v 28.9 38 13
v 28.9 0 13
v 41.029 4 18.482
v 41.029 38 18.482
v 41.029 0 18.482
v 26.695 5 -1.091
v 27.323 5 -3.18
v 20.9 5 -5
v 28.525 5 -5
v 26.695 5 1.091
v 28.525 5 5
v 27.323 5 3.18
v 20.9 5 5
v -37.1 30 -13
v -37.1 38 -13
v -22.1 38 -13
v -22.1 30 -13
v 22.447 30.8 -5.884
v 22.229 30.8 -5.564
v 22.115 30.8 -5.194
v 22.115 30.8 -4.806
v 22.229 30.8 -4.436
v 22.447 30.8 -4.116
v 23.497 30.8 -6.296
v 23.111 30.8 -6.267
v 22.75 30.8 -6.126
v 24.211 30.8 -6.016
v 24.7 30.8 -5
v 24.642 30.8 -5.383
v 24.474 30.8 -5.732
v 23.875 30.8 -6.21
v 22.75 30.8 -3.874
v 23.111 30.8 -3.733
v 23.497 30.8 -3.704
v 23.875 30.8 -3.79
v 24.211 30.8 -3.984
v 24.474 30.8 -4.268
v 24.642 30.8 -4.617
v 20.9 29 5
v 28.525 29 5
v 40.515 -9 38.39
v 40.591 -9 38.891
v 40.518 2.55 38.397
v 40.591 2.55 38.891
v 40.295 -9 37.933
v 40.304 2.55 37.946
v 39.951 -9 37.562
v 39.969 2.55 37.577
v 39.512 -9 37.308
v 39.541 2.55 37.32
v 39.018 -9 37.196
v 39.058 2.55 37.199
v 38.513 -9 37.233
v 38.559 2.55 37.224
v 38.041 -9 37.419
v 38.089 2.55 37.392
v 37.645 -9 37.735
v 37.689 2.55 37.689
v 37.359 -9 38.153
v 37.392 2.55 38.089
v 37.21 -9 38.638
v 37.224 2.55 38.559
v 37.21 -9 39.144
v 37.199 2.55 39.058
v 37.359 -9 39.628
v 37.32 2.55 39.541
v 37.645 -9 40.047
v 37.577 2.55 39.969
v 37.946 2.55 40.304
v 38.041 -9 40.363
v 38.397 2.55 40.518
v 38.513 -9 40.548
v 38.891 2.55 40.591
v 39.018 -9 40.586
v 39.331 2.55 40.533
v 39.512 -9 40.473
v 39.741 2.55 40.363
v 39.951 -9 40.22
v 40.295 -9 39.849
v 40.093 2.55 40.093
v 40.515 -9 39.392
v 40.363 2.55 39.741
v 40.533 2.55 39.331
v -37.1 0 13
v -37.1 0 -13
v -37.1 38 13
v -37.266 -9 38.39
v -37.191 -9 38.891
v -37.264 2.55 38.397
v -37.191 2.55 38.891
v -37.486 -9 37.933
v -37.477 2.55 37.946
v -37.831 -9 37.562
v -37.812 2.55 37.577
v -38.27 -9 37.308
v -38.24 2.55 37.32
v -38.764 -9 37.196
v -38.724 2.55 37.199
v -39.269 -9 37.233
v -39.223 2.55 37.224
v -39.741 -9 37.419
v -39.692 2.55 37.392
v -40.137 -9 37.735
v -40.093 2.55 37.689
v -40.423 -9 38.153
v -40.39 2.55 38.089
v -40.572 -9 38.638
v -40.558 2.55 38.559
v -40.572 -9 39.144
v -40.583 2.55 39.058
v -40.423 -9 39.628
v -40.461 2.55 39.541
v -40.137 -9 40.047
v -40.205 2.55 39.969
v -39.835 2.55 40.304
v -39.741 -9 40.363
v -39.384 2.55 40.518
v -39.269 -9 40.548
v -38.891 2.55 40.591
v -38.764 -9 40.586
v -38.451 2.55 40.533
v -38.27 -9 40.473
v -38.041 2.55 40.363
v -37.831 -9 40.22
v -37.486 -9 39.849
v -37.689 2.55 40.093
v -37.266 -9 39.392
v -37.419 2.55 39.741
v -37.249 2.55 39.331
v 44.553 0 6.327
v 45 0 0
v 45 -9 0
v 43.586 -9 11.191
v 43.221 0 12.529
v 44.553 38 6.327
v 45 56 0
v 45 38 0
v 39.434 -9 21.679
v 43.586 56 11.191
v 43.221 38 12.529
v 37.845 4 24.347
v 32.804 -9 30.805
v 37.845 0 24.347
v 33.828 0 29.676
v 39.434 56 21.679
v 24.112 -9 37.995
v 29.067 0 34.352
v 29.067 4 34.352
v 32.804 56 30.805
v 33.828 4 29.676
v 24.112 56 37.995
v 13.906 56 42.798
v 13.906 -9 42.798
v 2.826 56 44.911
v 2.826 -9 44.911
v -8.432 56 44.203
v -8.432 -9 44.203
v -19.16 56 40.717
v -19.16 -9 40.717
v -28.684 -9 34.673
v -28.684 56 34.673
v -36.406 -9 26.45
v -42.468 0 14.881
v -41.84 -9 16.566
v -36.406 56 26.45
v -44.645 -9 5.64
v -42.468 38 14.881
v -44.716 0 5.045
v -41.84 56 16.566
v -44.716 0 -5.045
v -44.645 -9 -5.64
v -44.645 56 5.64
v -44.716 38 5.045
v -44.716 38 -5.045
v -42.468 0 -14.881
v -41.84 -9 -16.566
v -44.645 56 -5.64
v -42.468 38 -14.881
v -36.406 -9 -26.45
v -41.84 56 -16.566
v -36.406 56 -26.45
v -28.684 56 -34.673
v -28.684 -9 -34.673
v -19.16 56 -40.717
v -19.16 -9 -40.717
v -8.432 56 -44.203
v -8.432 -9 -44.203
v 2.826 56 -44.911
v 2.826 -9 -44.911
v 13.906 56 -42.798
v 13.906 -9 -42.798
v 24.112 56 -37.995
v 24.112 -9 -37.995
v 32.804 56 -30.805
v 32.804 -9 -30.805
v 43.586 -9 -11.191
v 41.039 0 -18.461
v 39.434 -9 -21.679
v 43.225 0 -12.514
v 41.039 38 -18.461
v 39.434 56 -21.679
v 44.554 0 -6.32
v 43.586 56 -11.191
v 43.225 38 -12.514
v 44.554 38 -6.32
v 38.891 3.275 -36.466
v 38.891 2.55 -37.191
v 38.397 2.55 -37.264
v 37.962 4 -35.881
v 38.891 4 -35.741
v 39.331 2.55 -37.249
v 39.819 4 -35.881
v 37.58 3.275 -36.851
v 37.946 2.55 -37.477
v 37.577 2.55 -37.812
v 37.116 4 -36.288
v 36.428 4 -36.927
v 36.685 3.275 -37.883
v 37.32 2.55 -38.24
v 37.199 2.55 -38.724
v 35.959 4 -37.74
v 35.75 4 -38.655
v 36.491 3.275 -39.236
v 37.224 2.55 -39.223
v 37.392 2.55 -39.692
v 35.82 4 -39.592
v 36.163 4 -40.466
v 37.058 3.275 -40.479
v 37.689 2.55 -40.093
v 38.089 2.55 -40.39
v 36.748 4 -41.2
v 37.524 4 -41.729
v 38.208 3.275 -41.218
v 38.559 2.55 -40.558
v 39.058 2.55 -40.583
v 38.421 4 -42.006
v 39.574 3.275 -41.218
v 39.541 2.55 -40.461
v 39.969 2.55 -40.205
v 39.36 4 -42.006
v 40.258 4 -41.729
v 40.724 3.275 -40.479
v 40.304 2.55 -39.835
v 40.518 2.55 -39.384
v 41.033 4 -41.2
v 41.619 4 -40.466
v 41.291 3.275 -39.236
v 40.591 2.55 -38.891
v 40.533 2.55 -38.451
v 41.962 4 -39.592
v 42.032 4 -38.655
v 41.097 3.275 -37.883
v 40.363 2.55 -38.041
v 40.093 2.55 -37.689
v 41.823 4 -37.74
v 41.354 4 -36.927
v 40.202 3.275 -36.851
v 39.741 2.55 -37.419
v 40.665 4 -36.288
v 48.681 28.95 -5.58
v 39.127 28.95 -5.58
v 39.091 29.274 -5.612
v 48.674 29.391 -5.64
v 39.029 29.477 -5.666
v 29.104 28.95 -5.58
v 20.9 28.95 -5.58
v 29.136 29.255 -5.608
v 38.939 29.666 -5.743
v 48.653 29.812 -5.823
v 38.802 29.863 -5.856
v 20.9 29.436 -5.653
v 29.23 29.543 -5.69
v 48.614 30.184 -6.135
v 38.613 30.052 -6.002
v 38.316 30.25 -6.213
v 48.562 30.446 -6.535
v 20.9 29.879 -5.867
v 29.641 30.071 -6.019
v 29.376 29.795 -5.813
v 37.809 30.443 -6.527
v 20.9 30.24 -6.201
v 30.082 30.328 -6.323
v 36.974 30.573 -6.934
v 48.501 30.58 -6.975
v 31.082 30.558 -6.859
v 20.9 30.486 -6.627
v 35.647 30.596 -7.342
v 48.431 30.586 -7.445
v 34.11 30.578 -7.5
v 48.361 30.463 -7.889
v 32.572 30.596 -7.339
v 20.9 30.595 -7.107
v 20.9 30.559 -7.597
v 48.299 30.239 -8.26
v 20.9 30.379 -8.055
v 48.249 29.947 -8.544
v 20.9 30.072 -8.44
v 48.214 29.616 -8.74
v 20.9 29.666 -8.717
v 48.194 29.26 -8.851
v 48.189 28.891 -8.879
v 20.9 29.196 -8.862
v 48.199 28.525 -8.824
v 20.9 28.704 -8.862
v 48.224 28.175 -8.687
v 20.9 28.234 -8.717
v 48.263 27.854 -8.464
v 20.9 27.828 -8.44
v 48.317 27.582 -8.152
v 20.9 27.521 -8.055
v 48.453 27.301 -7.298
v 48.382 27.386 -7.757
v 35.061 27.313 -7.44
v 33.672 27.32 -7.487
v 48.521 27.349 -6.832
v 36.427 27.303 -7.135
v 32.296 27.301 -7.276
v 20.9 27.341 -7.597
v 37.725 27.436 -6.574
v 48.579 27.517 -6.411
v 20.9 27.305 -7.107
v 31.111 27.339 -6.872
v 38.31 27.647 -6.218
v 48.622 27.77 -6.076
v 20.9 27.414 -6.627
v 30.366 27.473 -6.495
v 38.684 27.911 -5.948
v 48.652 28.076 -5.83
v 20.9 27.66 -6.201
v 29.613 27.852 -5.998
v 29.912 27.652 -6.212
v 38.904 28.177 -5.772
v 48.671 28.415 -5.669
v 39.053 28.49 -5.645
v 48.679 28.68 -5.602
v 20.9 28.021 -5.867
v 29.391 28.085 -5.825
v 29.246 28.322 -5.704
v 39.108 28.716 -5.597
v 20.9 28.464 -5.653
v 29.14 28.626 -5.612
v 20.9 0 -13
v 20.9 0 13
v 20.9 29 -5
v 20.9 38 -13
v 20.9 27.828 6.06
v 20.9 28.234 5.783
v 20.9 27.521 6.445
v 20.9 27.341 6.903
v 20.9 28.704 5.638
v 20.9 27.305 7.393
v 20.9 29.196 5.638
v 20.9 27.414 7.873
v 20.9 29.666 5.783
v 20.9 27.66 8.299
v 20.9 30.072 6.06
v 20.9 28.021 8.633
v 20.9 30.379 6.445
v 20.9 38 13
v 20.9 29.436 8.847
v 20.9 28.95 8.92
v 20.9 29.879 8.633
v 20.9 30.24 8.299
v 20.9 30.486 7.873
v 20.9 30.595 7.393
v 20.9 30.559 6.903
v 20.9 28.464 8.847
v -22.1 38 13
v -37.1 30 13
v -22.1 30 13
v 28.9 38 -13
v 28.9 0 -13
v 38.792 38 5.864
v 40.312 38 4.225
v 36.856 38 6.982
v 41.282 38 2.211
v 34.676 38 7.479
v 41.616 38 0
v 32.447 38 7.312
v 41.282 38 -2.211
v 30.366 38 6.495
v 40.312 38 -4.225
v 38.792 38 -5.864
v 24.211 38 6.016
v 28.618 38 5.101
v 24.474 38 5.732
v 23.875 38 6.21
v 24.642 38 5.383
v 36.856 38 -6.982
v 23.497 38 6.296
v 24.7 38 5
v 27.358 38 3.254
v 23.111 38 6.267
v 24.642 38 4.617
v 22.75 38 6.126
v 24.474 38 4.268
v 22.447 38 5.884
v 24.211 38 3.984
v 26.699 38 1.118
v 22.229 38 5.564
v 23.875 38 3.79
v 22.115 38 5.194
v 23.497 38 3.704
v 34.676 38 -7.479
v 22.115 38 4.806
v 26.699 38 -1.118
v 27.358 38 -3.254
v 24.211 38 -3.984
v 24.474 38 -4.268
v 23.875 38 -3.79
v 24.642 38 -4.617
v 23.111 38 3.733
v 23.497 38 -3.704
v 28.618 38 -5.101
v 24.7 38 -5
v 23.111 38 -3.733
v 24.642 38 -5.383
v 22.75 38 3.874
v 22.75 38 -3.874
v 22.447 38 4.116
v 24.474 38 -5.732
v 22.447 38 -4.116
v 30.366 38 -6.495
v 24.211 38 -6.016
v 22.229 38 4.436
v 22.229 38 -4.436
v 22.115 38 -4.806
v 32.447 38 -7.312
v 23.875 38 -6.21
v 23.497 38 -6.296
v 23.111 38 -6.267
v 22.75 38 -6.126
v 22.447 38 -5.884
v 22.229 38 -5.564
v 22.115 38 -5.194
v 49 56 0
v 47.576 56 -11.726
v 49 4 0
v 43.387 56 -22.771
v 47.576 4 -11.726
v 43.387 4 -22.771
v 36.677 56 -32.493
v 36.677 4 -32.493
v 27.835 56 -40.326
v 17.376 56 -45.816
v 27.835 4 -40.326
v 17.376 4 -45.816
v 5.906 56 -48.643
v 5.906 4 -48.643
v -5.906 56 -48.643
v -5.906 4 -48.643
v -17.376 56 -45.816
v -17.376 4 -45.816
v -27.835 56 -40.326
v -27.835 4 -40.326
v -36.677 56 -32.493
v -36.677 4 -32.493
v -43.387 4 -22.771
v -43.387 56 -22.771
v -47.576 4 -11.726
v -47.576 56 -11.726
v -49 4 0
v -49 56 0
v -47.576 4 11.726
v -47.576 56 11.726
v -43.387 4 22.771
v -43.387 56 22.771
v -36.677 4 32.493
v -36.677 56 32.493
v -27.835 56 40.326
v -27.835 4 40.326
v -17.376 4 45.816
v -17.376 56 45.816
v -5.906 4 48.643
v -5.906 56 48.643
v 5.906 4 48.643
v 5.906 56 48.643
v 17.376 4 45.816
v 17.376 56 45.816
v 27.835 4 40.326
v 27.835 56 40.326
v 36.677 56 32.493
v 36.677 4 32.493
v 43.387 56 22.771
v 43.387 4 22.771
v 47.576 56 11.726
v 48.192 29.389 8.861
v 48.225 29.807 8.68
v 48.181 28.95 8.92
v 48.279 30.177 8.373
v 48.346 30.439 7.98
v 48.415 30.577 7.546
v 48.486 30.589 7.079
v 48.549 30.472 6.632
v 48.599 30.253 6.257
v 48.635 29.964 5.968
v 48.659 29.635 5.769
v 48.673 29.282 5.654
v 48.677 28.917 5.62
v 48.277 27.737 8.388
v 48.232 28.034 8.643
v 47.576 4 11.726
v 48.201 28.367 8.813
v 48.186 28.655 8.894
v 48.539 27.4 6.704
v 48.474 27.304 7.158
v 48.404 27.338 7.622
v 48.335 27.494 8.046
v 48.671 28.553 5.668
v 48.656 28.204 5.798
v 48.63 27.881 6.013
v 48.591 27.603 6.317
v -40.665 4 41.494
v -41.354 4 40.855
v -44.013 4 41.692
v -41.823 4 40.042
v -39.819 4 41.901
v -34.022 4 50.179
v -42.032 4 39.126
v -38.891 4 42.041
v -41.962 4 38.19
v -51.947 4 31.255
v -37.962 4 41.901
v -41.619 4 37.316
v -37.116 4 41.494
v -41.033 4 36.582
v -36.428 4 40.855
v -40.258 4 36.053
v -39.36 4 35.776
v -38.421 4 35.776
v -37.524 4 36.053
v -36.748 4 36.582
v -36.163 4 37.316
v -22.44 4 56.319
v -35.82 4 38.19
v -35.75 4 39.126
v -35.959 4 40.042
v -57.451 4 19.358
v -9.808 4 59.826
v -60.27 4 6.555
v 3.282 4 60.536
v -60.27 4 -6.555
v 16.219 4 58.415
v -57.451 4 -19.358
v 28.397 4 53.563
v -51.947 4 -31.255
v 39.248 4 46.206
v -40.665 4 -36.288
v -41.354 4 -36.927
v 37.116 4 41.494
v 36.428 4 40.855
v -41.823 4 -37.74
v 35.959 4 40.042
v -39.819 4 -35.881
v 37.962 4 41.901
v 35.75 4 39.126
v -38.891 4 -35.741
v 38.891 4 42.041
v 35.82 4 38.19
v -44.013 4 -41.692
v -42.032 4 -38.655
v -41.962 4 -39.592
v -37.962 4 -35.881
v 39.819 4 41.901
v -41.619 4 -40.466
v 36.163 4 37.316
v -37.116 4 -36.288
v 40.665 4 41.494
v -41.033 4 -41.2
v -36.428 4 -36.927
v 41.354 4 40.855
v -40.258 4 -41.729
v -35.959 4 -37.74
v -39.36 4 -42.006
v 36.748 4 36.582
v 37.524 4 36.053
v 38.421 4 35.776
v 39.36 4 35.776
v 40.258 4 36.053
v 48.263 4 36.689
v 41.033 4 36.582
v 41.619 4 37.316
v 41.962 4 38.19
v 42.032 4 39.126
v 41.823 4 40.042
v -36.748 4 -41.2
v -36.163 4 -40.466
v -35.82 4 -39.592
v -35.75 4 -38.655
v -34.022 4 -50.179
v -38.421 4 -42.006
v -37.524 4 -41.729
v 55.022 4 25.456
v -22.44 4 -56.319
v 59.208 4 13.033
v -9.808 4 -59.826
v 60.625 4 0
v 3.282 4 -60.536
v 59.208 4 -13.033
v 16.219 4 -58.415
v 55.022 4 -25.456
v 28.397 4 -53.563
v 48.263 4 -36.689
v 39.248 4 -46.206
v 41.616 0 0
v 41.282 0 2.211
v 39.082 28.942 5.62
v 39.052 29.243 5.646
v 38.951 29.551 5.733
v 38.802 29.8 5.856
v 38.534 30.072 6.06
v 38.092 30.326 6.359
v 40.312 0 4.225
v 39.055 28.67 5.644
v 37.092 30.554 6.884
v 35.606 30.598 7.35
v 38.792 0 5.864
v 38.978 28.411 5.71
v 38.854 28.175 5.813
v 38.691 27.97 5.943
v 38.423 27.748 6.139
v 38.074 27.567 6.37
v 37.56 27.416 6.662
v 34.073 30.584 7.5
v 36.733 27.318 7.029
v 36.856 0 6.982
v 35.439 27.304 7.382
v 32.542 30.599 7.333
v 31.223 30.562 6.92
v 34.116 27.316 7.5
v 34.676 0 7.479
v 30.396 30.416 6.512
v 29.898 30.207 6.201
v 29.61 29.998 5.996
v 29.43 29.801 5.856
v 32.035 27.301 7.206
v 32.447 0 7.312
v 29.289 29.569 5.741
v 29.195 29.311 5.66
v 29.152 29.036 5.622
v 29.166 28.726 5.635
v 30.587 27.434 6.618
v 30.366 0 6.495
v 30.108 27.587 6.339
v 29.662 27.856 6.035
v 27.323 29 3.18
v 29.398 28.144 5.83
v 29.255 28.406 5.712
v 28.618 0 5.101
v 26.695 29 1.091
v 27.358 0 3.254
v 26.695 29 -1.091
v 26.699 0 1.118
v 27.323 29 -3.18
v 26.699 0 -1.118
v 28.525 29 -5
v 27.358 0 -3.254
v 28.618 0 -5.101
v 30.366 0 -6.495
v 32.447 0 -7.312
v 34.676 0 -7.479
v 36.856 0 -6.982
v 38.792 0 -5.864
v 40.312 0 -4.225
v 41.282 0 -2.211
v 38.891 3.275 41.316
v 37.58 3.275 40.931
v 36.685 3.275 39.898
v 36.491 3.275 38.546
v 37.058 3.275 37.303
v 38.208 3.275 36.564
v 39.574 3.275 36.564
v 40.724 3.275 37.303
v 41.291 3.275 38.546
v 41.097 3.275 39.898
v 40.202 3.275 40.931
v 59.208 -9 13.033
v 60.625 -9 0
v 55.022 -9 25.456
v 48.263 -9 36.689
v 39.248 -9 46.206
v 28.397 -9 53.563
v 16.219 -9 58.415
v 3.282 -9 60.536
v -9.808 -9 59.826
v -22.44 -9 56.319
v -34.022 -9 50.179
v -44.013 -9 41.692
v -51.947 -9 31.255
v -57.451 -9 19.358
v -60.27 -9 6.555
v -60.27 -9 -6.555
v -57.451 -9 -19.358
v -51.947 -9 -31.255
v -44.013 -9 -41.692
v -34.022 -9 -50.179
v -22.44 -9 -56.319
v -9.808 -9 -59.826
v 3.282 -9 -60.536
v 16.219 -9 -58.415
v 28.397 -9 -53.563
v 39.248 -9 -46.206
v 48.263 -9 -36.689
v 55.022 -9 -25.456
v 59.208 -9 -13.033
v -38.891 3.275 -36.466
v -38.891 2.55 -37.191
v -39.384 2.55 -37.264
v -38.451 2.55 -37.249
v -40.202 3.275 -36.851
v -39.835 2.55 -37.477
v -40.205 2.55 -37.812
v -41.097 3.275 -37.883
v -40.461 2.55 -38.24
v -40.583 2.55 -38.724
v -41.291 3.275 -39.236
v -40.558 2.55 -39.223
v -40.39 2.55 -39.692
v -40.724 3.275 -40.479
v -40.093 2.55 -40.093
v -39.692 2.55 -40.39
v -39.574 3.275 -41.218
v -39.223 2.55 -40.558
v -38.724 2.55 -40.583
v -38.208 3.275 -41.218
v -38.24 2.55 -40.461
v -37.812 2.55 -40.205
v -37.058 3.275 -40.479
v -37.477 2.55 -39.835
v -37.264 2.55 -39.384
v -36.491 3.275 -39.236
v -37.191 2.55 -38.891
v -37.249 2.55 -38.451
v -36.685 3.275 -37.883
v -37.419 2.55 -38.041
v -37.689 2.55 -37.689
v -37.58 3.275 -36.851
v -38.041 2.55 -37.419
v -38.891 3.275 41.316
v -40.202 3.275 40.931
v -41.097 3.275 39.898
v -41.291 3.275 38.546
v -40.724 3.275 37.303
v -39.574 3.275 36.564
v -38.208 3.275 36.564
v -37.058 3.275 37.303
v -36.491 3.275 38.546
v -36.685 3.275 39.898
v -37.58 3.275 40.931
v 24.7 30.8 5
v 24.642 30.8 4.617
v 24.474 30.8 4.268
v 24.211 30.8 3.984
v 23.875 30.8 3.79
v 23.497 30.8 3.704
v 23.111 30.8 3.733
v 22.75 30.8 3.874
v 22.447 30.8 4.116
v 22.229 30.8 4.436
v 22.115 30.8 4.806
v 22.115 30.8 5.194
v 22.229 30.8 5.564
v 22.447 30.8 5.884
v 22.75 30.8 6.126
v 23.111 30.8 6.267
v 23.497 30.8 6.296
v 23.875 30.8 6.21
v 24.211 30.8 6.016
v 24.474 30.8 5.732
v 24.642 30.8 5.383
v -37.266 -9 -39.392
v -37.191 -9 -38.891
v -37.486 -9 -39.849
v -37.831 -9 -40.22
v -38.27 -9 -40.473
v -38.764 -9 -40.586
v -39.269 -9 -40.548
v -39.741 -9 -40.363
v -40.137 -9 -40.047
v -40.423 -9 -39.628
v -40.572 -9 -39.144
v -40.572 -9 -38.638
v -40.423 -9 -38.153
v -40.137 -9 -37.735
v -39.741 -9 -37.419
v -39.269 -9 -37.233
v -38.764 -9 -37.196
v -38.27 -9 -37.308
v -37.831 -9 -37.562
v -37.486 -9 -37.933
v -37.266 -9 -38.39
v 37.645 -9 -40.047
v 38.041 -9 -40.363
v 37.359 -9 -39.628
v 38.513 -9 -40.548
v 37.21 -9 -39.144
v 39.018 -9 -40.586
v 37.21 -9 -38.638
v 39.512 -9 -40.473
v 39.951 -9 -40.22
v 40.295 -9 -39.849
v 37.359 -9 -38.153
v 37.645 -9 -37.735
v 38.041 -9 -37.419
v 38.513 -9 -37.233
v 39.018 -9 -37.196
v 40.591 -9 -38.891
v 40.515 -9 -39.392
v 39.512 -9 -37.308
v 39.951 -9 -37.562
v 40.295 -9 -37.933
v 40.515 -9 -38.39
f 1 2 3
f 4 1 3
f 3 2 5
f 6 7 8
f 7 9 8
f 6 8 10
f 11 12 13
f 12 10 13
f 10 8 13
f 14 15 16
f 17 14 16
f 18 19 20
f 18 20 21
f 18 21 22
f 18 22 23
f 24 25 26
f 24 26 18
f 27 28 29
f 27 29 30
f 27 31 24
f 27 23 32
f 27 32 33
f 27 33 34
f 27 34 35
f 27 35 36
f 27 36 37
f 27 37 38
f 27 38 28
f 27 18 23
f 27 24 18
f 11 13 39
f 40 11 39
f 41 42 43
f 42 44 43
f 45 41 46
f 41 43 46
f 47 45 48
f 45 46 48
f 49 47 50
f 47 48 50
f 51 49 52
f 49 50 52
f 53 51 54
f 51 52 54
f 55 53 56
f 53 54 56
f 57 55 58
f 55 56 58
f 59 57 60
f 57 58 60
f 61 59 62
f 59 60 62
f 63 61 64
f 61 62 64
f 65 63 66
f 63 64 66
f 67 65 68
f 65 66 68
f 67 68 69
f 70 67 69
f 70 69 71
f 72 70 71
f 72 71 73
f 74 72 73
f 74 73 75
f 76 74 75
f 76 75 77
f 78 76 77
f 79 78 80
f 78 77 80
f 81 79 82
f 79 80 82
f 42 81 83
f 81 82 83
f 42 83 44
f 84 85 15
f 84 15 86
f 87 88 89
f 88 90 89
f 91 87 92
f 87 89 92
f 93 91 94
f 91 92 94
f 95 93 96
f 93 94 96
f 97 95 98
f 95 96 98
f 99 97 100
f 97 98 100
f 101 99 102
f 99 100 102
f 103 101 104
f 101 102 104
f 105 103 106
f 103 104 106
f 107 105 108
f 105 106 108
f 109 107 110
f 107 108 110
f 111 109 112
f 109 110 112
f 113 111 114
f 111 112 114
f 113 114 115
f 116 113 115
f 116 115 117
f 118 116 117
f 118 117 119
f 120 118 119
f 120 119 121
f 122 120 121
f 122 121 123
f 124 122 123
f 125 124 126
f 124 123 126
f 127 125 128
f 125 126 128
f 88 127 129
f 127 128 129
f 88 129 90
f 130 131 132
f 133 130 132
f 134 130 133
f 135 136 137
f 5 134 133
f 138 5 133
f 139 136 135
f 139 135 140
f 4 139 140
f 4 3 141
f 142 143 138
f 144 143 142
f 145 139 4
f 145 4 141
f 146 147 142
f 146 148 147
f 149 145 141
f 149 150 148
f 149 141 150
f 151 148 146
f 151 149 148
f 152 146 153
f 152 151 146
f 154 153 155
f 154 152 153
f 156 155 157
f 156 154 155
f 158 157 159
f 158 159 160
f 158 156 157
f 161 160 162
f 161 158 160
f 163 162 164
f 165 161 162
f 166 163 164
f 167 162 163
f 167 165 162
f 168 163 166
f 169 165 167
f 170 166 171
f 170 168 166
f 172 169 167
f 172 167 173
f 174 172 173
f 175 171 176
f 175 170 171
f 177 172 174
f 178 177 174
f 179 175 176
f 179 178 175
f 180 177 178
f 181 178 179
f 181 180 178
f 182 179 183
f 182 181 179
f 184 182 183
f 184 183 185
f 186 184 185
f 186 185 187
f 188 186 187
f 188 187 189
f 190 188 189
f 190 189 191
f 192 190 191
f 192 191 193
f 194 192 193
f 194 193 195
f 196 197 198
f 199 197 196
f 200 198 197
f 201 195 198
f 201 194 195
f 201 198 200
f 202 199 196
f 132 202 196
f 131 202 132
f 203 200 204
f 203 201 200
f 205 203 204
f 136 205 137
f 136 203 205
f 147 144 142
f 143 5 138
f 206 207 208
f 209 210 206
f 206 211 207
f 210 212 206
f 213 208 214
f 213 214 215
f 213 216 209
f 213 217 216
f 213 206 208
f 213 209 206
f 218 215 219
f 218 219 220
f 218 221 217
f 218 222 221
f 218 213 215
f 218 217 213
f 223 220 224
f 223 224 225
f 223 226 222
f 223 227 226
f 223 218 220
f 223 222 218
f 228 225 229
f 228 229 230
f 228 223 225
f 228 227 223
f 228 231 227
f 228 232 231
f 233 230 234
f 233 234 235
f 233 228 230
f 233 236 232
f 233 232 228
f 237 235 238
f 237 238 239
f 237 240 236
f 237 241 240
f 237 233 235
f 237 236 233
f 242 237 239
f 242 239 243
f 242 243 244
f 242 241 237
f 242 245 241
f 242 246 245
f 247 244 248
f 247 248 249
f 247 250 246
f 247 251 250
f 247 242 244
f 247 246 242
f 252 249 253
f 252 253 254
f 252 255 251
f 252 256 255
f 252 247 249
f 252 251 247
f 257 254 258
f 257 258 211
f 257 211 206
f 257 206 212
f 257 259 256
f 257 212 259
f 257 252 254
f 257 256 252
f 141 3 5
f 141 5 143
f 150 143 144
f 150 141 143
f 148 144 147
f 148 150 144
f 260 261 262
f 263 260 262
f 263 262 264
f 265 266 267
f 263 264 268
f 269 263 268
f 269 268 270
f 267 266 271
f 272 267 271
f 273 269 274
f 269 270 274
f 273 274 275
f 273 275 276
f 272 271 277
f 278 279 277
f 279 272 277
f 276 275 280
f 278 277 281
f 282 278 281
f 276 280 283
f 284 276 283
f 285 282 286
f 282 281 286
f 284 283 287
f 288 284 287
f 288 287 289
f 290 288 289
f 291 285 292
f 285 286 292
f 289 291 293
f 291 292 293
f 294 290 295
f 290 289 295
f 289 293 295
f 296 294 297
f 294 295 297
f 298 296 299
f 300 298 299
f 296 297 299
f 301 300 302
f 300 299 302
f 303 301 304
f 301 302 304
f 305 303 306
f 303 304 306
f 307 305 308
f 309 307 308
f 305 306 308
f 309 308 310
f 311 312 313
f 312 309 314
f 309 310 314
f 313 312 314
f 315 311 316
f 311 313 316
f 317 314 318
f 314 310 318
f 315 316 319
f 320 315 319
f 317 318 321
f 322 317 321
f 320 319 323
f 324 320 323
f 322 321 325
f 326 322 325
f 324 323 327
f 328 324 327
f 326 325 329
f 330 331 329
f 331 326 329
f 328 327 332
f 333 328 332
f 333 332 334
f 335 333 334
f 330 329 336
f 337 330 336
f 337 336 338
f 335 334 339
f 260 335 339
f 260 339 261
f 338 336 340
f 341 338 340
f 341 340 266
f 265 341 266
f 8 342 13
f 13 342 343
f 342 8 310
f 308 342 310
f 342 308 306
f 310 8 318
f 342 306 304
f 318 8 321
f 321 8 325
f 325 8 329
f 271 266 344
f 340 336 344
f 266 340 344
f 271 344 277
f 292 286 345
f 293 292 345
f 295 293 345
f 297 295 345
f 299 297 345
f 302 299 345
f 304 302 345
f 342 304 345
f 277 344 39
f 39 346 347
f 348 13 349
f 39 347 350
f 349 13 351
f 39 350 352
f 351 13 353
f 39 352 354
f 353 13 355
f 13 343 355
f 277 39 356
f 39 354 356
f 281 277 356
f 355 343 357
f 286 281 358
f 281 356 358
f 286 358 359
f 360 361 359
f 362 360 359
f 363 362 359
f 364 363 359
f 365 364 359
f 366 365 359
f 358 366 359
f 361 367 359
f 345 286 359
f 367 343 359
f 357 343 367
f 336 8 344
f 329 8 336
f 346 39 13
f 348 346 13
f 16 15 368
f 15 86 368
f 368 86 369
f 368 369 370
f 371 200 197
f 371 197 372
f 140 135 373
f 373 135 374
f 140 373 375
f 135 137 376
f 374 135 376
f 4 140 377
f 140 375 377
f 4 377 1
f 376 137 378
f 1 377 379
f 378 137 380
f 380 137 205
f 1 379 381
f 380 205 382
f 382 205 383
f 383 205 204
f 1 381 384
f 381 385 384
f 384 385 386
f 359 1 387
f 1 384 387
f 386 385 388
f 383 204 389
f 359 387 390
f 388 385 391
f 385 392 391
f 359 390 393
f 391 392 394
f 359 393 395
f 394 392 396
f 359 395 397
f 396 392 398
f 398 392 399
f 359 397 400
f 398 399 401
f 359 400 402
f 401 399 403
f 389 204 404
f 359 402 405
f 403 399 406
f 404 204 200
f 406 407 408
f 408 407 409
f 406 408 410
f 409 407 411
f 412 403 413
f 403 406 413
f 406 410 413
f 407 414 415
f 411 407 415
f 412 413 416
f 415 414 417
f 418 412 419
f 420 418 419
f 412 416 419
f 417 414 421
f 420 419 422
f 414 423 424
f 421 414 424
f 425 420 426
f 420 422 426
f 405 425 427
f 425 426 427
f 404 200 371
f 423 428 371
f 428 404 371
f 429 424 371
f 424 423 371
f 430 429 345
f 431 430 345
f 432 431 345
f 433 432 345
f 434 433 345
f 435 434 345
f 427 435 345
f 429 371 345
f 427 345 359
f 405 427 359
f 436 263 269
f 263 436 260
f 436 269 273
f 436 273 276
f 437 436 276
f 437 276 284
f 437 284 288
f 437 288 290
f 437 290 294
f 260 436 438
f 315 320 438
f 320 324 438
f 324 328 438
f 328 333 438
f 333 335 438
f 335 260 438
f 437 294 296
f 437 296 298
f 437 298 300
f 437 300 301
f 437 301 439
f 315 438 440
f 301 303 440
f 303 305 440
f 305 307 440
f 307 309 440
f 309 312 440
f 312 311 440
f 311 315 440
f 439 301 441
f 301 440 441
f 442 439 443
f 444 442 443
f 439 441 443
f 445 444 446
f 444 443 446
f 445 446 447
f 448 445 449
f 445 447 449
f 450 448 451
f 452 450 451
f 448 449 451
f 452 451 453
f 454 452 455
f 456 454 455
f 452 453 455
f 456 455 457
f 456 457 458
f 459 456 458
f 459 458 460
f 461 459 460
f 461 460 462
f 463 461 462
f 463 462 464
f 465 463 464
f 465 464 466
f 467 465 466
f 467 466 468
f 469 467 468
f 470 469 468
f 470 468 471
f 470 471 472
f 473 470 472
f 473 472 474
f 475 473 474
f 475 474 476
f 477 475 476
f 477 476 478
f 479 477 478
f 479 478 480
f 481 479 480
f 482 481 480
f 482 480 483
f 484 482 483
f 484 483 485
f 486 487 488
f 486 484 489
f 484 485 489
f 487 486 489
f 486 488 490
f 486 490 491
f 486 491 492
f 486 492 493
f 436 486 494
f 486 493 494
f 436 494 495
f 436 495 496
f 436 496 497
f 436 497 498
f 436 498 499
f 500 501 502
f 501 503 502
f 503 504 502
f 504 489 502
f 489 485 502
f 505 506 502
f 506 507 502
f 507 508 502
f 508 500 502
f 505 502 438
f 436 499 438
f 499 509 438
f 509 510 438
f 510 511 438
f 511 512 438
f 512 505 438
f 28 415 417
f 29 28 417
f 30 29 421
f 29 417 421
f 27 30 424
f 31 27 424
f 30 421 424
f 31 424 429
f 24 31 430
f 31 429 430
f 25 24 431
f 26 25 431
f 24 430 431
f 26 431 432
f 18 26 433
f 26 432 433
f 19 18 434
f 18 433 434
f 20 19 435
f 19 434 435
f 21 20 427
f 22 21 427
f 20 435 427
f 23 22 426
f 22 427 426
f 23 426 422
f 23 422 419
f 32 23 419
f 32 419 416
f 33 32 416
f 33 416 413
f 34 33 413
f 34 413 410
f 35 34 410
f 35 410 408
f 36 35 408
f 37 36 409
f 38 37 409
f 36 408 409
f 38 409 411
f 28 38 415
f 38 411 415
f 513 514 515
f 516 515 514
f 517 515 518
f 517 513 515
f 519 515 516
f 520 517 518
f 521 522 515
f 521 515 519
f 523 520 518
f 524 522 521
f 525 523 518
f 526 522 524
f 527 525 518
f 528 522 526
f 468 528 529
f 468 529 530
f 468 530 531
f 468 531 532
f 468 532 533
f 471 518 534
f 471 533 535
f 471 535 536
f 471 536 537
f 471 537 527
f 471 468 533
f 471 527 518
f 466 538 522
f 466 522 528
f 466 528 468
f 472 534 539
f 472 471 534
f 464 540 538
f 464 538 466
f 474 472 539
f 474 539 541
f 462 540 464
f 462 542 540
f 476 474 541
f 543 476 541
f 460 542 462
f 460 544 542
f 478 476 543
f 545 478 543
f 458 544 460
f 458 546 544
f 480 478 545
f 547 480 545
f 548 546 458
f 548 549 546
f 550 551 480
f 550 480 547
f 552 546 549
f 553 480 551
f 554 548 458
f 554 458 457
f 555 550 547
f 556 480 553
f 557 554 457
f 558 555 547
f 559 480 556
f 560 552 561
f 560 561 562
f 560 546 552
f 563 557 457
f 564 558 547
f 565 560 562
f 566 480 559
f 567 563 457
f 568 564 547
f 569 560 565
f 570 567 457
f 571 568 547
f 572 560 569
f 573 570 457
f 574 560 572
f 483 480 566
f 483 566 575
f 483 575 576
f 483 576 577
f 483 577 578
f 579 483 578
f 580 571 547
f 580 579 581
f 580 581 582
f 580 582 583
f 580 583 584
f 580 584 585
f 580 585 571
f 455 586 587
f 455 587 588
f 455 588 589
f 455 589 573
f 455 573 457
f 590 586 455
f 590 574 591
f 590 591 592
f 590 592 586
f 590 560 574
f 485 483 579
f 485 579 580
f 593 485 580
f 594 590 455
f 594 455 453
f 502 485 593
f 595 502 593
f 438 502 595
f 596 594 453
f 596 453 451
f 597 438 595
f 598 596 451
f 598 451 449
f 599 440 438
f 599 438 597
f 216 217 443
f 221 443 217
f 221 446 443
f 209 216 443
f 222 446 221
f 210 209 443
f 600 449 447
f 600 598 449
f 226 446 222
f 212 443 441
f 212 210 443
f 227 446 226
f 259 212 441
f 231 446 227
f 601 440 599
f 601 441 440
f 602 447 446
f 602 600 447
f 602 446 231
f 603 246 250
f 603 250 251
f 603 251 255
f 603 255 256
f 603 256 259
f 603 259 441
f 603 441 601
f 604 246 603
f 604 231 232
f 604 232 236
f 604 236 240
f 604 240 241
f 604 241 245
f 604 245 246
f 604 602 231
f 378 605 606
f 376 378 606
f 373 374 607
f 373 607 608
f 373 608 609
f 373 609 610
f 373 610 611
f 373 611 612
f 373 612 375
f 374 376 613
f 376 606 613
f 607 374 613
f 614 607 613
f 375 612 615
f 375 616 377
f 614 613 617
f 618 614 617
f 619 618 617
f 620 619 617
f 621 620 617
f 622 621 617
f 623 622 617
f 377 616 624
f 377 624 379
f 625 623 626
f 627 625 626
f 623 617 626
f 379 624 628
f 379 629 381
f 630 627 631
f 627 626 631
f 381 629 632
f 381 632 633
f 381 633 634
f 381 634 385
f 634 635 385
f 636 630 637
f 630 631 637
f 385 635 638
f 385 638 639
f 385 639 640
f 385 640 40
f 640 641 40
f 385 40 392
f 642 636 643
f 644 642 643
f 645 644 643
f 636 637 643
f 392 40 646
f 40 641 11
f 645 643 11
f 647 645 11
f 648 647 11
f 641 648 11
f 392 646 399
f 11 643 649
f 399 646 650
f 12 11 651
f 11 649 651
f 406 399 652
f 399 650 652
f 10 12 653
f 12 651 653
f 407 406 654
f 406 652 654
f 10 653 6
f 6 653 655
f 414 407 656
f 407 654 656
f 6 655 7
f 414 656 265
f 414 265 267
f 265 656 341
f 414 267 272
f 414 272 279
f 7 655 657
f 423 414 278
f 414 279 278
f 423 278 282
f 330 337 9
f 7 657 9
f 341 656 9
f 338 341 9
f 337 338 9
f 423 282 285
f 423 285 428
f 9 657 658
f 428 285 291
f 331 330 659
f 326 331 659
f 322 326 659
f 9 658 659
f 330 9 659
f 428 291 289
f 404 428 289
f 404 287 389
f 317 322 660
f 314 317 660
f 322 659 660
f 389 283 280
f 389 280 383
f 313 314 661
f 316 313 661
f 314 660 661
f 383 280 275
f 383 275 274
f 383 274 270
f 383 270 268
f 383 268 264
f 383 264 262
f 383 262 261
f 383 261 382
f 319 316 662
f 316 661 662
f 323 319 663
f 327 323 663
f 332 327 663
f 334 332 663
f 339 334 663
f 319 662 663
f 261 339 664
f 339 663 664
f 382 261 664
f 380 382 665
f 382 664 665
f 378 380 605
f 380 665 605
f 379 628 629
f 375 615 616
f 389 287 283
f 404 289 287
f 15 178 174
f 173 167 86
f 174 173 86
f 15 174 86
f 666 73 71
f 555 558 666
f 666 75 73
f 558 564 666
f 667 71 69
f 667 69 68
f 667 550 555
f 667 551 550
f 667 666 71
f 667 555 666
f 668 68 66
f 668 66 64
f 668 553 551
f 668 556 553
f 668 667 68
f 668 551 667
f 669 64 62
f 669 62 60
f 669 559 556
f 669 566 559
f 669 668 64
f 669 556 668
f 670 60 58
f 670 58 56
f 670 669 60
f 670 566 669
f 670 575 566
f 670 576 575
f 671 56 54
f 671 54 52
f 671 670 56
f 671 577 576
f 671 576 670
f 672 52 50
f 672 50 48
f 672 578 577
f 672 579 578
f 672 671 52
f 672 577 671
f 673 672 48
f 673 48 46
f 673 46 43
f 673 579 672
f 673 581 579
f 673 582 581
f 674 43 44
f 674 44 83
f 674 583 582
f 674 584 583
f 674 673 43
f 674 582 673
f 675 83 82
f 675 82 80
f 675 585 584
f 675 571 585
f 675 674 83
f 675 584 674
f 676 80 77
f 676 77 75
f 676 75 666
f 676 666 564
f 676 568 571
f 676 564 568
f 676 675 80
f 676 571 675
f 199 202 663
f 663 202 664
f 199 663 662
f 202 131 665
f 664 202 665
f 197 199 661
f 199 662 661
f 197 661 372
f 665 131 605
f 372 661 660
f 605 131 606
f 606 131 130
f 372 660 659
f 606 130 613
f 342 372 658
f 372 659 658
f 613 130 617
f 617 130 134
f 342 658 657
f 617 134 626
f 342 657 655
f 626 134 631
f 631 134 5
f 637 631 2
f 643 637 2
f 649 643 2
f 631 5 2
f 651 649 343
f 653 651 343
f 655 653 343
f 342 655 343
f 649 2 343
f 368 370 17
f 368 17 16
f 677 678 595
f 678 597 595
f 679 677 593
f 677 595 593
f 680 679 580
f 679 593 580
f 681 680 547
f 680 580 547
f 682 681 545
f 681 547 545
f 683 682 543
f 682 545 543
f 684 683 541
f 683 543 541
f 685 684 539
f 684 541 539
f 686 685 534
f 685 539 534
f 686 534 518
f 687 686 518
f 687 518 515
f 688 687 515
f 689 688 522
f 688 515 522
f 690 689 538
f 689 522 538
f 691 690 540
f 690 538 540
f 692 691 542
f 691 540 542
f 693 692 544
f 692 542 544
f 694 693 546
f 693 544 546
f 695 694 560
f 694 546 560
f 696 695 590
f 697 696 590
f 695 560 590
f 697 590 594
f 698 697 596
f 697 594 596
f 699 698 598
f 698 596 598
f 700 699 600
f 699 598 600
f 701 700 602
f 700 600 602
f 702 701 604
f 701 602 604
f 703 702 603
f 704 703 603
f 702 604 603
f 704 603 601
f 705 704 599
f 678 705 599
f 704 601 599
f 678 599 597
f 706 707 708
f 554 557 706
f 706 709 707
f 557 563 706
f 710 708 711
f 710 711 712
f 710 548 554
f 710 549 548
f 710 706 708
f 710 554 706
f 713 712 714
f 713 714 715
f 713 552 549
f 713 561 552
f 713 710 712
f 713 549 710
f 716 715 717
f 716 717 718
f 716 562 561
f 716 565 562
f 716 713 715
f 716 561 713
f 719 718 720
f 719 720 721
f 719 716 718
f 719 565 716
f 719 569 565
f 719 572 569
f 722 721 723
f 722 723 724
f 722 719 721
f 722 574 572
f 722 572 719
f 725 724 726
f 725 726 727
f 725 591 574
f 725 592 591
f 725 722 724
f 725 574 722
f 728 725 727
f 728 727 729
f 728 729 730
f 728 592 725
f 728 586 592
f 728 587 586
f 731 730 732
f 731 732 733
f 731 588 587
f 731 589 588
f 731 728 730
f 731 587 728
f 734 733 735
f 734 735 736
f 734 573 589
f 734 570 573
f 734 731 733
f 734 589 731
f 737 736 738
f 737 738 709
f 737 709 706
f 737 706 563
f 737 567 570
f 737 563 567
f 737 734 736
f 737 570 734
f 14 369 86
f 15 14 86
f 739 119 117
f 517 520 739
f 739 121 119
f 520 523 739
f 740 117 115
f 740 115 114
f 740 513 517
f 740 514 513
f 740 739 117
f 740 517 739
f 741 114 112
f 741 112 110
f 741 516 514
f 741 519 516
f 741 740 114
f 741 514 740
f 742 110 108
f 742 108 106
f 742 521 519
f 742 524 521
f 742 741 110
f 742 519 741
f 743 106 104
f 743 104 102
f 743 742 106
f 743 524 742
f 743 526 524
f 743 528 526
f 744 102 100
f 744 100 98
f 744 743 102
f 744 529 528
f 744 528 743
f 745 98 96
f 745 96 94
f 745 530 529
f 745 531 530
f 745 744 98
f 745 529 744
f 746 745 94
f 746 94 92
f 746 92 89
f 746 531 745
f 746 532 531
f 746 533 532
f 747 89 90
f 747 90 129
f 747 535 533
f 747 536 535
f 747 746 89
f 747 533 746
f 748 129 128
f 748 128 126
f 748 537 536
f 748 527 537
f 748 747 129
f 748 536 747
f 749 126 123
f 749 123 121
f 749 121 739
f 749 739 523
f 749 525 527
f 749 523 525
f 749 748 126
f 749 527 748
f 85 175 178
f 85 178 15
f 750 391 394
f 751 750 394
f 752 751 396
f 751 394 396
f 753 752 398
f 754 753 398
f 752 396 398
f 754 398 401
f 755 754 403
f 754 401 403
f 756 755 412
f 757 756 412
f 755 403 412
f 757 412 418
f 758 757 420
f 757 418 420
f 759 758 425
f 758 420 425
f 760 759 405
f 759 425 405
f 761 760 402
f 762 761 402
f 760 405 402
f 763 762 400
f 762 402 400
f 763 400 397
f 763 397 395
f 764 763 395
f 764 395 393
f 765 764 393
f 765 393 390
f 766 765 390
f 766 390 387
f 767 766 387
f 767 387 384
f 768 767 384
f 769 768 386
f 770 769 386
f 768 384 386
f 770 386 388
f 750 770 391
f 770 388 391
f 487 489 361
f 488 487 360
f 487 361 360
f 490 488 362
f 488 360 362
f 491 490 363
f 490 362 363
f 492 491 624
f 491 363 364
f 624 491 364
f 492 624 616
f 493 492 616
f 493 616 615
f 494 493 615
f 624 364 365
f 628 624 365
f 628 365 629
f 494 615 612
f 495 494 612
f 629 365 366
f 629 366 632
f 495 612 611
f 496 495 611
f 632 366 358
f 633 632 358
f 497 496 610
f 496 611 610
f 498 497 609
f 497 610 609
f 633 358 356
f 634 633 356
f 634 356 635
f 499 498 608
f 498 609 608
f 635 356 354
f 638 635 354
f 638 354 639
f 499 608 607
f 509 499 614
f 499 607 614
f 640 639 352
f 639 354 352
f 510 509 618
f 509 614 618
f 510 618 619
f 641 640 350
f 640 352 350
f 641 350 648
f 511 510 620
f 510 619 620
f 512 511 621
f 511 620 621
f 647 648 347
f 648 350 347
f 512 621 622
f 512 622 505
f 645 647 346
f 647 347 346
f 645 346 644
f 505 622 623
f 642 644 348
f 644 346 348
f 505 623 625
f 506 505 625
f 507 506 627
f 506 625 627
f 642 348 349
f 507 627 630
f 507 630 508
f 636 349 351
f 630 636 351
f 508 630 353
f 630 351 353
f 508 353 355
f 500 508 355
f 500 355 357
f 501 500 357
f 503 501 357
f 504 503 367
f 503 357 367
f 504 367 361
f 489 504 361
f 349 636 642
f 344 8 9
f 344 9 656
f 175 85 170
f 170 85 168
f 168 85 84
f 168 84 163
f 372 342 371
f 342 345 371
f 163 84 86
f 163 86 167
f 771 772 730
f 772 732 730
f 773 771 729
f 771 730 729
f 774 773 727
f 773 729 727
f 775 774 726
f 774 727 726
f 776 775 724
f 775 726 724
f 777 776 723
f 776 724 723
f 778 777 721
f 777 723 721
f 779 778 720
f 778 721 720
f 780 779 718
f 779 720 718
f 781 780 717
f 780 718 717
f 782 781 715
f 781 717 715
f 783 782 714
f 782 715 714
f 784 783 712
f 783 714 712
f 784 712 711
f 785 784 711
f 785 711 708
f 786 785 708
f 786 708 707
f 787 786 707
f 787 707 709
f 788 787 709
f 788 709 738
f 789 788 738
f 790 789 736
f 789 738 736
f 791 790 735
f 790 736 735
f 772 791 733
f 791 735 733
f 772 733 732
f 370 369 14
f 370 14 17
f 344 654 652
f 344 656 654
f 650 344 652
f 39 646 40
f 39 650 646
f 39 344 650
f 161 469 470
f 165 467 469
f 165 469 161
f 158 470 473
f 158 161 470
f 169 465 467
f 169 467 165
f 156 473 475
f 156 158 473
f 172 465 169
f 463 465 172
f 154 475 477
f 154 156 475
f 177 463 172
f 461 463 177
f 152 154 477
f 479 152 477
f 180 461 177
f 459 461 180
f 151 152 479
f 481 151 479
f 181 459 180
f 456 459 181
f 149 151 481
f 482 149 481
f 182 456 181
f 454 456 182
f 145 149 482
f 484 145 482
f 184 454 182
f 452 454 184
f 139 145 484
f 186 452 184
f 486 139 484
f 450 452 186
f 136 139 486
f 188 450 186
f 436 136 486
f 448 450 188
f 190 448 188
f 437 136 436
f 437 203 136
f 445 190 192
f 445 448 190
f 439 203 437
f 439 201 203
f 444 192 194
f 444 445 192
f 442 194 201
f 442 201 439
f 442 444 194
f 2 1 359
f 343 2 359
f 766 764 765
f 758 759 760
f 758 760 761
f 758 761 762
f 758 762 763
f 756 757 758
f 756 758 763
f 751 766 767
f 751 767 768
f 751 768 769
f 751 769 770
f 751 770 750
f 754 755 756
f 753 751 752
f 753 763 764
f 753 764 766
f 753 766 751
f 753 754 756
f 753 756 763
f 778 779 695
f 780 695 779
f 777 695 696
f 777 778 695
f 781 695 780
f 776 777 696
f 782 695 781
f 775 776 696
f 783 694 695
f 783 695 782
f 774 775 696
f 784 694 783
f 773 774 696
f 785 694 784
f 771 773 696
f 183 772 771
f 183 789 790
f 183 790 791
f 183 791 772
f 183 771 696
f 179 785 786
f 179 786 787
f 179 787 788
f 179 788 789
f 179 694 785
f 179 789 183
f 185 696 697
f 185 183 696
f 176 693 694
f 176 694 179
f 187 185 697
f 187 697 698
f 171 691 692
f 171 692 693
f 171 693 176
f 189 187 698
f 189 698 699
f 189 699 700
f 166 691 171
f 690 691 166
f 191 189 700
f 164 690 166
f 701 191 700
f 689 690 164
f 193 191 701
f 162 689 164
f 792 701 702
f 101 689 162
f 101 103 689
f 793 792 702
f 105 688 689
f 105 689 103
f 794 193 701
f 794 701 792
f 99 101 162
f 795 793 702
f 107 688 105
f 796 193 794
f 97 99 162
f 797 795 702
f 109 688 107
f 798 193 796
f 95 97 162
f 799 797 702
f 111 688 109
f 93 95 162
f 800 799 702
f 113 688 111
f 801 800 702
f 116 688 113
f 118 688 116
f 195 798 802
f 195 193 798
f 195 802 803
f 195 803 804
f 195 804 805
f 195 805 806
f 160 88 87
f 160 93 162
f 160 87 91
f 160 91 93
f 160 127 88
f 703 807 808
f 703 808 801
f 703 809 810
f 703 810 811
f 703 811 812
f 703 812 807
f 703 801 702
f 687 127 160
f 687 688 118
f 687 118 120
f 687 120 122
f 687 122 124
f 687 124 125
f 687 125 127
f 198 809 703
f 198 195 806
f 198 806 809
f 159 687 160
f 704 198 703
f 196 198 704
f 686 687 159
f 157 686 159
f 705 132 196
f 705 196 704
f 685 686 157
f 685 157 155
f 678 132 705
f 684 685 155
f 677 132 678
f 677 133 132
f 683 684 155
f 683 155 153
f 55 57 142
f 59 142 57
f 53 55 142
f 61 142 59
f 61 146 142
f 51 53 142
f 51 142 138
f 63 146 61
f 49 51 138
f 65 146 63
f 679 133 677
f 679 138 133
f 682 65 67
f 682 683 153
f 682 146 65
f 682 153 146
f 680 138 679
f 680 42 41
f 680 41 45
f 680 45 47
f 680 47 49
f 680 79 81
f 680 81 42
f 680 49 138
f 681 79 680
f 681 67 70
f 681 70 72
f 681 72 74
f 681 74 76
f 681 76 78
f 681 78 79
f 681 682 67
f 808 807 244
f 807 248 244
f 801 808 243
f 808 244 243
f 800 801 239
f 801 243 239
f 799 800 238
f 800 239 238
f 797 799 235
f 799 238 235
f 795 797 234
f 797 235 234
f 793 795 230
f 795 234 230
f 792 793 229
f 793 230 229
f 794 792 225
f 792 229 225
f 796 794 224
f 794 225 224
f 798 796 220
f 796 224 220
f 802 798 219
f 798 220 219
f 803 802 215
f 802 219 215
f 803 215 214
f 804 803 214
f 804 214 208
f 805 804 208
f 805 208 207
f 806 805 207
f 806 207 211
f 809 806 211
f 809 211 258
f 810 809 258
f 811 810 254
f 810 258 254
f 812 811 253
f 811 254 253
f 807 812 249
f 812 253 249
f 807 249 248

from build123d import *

# Parameters (mm, degrees)
SKETCH1_R                                    = 60.625
SKETCH1_R_2                                  = 45
BOSS_EXTRUDE1_DEPTH                          = 4
SKETCH2_R                                    = 49
SKETCH2_R_2                                  = 45
BOSS_EXTRUDE2_DEPTH                          = 52
SKETCH4_W                                    = 8
SKETCH4_H                                    = 38
BOSS_EXTRUDE4_DEPTH                          = 13
SKETCH4_W_2                                  = 15
SKETCH4_H_2                                  = 8
BOSS_EXTRUDE4_2_DEPTH                        = 13
BOSS_EXTRUDE5_DEPTH                          = 4
SKETCH7_R                                    = 1.3
CUT_EXTRUDE4_DEPTH                           = 7.2
SKETCH9_W                                    = 10
SKETCH9_H                                    = 24
CUT_EXTRUDE7_DEPTH                           = 8
CUT_EXTRUDE9_DEPTH                           = 5
CSK_FOR_M3_COUNTERSUNK_FLAT_HEAD_SCR_2_COUNT = 2
CSK_FOR_M3_COUNTERSUNK_FLAT_HEAD_SCR_2_PITCH = 77.781745931
CSK_FOR_M3_COUNTERSUNK_FLAT_HEAD_SCR_3_COUNT = 2
CSK_FOR_M3_COUNTERSUNK_FLAT_HEAD_SCR_3_PITCH = 110
CSK_FOR_M3_COUNTERSUNK_FLAT_HEAD_SCR_4_COUNT = 2
CSK_FOR_M3_COUNTERSUNK_FLAT_HEAD_SCR_4_PITCH = 77.781745931
SALIENTE_EXTRUIR1_DEPTH                      = 38
SALIENTE_EXTRUIR2_DEPTH                      = 38
CROQUIS7_R                                   = 7.5
CORTAR_EXTRUIR1_DEPTH                        = 38
CROQUIS9_R                                   = 1.65
CORTAR_EXTRUIR2_DEPTH                        = 40.725
CROQUIS12_R                                  = 60.625
CROQUIS12_R_2                                = 45
SALIENTE_EXTRUIR4_DEPTH                      = 9
CROQUIS14_R                                  = 1.7
CORTAR_EXTRUIR4_DEPTH                        = 14


with BuildPart() as part:
    # Sketch1 → Boss-Extrude1 (new body)
    with BuildSketch(Plane(origin=(0, 0, 0), x_dir=(1, 0, 0), z_dir=(0, 1, 0))):
        Circle(SKETCH1_R)
        Circle(SKETCH1_R_2, mode=Mode.SUBTRACT)
    extrude(amount=BOSS_EXTRUDE1_DEPTH)

    # Sketch2 → Boss-Extrude2 (add)
    with BuildSketch(Plane(origin=(0, 4, 0), x_dir=(1, 0, 0), z_dir=(0, 1, 0))):
        Circle(SKETCH2_R)
        Circle(SKETCH2_R_2, mode=Mode.SUBTRACT)
    extrude(amount=BOSS_EXTRUDE2_DEPTH)



with BuildPart() as body_2:
    # Sketch4 → Boss-Extrude4 (new body, symmetric)
    with BuildSketch(Plane.XY):
        with Locations((24.9, 19)):
            Rectangle(SKETCH4_W, SKETCH4_H)
    extrude(amount=BOSS_EXTRUDE4_DEPTH, both=True)


with BuildPart() as body_3:
    # Sketch4 → Boss-Extrude4 2 (new body, symmetric)
    with BuildSketch(Plane.XY):
        with Locations((-29.6, 34)):
            Rectangle(SKETCH4_W_2, SKETCH4_H_2)
    extrude(amount=BOSS_EXTRUDE4_2_DEPTH, both=True)


with BuildPart() as part_1:
    add(part.part)

    add(body_2.part)  # Boss-Extrude5 merges body 2
    # Sketch5 → Boss-Extrude5 (add)
    with BuildSketch(Plane.XZ):
        with BuildLine():
            Line((20.9, 13), (29.067400866, 34.352382842))
            ThreePointArc((29.067400866, 34.352382842), (45, 0), (29.067400866, -34.352382842))
            Line((29.067400866, -34.352382842), (20.9, -13))
            Line((20.9, -13), (20.9, 13))
        make_face()
    extrude(amount=-BOSS_EXTRUDE5_DEPTH)

    # Sketch7 → Cut-Extrude4 (cut)
    with BuildSketch(Plane(origin=(0, 38, 0), x_dir=(1, 0, 0), z_dir=(0, 1, 0))):
        with Locations((-24.6, 5)):
            Circle(SKETCH7_R)
        with Locations((-24.6, -5)):
            Circle(SKETCH7_R)
        with Locations((23.4, 5)):
            Circle(SKETCH7_R)
        with Locations((23.4, -5)):
            Circle(SKETCH7_R)
    extrude(amount=-CUT_EXTRUDE4_DEPTH, mode=Mode.SUBTRACT)

    # Sketch9 → Cut-Extrude7 (cut)
    with BuildSketch(Plane.ZY.offset(-20.9)):
        with Locations((0, 17)):
            Rectangle(SKETCH9_W, SKETCH9_H)
    extrude(amount=-CUT_EXTRUDE7_DEPTH, mode=Mode.SUBTRACT)

    # Sketch12 → Cut-Extrude9 (cut, through all)
    with BuildSketch(Plane(origin=(0, 4, 0), x_dir=(1, 0, 0), z_dir=(0, 1, 0))):
        with BuildLine():
            ThreePointArc((36.9, -2.718455444), (37, 0), (36.9, 2.718455444))
            Line((36.9, 2.718455444), (36.9, -2.718455444))
        make_face()
        with BuildLine():
            ThreePointArc((29.067400866, -34.352382842), (40.822990085, -18.933659987), (45, 0))
            ThreePointArc((45, 0), (40.822990085, 18.933659987), (29.067400866, 34.352382842))
            Line((29.067400866, 34.352382842), (20.9, 13))
            Line((20.9, 13), (28.9, 13))
            Line((28.9, 13), (28.9, -13))
            Line((28.9, -13), (20.9, -13))
            Line((20.9, -13), (29.067400866, -34.352382842))
        make_face()
        with BuildLine():
            Line((36.9, -2.718455444), (36.9, 2.718455444))
            ThreePointArc((36.9, 2.718455444), (37, 0), (36.9, -2.718455444))
        make_face(mode=Mode.SUBTRACT)
    extrude(amount=-CUT_EXTRUDE9_DEPTH, mode=Mode.SUBTRACT)

    # Sketch17 → CSK for M3 Countersunk Flat Head Screw1 (revolve, cut)
    with BuildSketch(Plane(origin=(-38.890872965, 4, -38.890872965), x_dir=(0, 0, 1), z_dir=(1, 0, 0))):
        Polygon((0, 0), (0, 4.001), (1.7, 4.001), (1.7, 1.45), (3.15, 0), align=None)
    csk_for_m3_countersunk_flat_head_screw1 = revolve(axis=Axis((-38.890872965, 10.35, -38.890872965), (0, -1, 0)), mode=Mode.SUBTRACT)

    # CSK for M3 Countersunk Flat Head Scr 2: CSK for M3 Countersunk Flat Head Screw1 ×2
    with Locations(*[(0, 0, i * CSK_FOR_M3_COUNTERSUNK_FLAT_HEAD_SCR_2_PITCH) for i in range(1, CSK_FOR_M3_COUNTERSUNK_FLAT_HEAD_SCR_2_COUNT)]):
        add(csk_for_m3_countersunk_flat_head_screw1, mode=Mode.SUBTRACT)

    # CSK for M3 Countersunk Flat Head Scr 3: CSK for M3 Countersunk Flat Head Screw1 ×2
    with Locations(*[Vector(0.707106781, 0, 0.707106781) * (i * CSK_FOR_M3_COUNTERSUNK_FLAT_HEAD_SCR_3_PITCH) for i in range(1, CSK_FOR_M3_COUNTERSUNK_FLAT_HEAD_SCR_3_COUNT)]):
        add(csk_for_m3_countersunk_flat_head_screw1, mode=Mode.SUBTRACT)

    # CSK for M3 Countersunk Flat Head Scr 4: CSK for M3 Countersunk Flat Head Screw1 ×2
    with Locations(*[(i * CSK_FOR_M3_COUNTERSUNK_FLAT_HEAD_SCR_4_PITCH, 0, 0) for i in range(1, CSK_FOR_M3_COUNTERSUNK_FLAT_HEAD_SCR_4_COUNT)]):
        add(csk_for_m3_countersunk_flat_head_screw1, mode=Mode.SUBTRACT)

    # Croquis3 → Saliente-Extruir1 (add)
    with BuildSketch(Plane.XZ):
        Polygon((28.9, 13), (41.02948985, 18.481909063), (41.039124346, -18.460505761), (28.9, -13), align=None)
        with BuildLine():
            Line((-37.1, 13), (-42.468269464, 14.881064772))
            ThreePointArc((-42.468269464, 14.881064772), (-45, 0), (-42.468269464, -14.881064772))
            Line((-42.468269464, -14.881064772), (-37.1, -13))
            Line((-37.1, -13), (-37.1, 13))
        make_face()
    extrude(amount=-SALIENTE_EXTRUIR1_DEPTH)

    # Croquis6 → Saliente-Extruir2 (add)
    with BuildSketch(Plane(origin=(0, 0, 0), x_dir=(1, 0, 0), z_dir=(0, 1, 0))):
        Polygon((41.039124346, 18.460505761), (43.840051606, 18.460505761), (46.523602828, 6.268088211), (46.523602828, -4.665099601), (45, -15.515113827), (44.583260481, -18.482835878), (41.02948985, -18.481909063), align=None)
    extrude(amount=SALIENTE_EXTRUIR2_DEPTH)

    # Croquis7 → Cortar-Extruir1 (cut)
    with BuildSketch(Plane.XZ):
        with Locations((34.115531068, 0)):
            Circle(CROQUIS7_R)
    extrude(amount=-CORTAR_EXTRUIR1_DEPTH, mode=Mode.SUBTRACT)

    # Croquis9 → Cortar-Extruir2 (cut, through all)
    with BuildSketch(Plane.ZY.offset(-20.9)):
        with Locations((-7.23, 28.95)):
            Circle(CROQUIS9_R)
        with Locations((7.27, 28.95)):
            Circle(CROQUIS9_R)
    extrude(amount=-CORTAR_EXTRUIR2_DEPTH, mode=Mode.SUBTRACT)

    # Croquis12 → Saliente-Extruir4 (add)
    with BuildSketch(Plane.XZ):
        Circle(CROQUIS12_R)
        Circle(CROQUIS12_R_2, mode=Mode.SUBTRACT)
    extrude(amount=SALIENTE_EXTRUIR4_DEPTH)

    # Croquis14 → Cortar-Extruir4 (cut, through all)
    with BuildSketch(Plane(origin=(0, 4, 0), x_dir=(1, 0, 0), z_dir=(0, 1, 0))):
        with Locations((-38.890872965, 38.890872965)):
            Circle(CROQUIS14_R)
        with Locations((38.890872965, 38.890872965)):
            Circle(CROQUIS14_R)
        with Locations((38.890872965, -38.890872965)):
            Circle(CROQUIS14_R)
        with Locations((-38.890872965, -38.890872965)):
            Circle(CROQUIS14_R)
    extrude(amount=-CORTAR_EXTRUIR4_DEPTH, mode=Mode.SUBTRACT)


solid = Compound([body_3.part, part_1.part])
